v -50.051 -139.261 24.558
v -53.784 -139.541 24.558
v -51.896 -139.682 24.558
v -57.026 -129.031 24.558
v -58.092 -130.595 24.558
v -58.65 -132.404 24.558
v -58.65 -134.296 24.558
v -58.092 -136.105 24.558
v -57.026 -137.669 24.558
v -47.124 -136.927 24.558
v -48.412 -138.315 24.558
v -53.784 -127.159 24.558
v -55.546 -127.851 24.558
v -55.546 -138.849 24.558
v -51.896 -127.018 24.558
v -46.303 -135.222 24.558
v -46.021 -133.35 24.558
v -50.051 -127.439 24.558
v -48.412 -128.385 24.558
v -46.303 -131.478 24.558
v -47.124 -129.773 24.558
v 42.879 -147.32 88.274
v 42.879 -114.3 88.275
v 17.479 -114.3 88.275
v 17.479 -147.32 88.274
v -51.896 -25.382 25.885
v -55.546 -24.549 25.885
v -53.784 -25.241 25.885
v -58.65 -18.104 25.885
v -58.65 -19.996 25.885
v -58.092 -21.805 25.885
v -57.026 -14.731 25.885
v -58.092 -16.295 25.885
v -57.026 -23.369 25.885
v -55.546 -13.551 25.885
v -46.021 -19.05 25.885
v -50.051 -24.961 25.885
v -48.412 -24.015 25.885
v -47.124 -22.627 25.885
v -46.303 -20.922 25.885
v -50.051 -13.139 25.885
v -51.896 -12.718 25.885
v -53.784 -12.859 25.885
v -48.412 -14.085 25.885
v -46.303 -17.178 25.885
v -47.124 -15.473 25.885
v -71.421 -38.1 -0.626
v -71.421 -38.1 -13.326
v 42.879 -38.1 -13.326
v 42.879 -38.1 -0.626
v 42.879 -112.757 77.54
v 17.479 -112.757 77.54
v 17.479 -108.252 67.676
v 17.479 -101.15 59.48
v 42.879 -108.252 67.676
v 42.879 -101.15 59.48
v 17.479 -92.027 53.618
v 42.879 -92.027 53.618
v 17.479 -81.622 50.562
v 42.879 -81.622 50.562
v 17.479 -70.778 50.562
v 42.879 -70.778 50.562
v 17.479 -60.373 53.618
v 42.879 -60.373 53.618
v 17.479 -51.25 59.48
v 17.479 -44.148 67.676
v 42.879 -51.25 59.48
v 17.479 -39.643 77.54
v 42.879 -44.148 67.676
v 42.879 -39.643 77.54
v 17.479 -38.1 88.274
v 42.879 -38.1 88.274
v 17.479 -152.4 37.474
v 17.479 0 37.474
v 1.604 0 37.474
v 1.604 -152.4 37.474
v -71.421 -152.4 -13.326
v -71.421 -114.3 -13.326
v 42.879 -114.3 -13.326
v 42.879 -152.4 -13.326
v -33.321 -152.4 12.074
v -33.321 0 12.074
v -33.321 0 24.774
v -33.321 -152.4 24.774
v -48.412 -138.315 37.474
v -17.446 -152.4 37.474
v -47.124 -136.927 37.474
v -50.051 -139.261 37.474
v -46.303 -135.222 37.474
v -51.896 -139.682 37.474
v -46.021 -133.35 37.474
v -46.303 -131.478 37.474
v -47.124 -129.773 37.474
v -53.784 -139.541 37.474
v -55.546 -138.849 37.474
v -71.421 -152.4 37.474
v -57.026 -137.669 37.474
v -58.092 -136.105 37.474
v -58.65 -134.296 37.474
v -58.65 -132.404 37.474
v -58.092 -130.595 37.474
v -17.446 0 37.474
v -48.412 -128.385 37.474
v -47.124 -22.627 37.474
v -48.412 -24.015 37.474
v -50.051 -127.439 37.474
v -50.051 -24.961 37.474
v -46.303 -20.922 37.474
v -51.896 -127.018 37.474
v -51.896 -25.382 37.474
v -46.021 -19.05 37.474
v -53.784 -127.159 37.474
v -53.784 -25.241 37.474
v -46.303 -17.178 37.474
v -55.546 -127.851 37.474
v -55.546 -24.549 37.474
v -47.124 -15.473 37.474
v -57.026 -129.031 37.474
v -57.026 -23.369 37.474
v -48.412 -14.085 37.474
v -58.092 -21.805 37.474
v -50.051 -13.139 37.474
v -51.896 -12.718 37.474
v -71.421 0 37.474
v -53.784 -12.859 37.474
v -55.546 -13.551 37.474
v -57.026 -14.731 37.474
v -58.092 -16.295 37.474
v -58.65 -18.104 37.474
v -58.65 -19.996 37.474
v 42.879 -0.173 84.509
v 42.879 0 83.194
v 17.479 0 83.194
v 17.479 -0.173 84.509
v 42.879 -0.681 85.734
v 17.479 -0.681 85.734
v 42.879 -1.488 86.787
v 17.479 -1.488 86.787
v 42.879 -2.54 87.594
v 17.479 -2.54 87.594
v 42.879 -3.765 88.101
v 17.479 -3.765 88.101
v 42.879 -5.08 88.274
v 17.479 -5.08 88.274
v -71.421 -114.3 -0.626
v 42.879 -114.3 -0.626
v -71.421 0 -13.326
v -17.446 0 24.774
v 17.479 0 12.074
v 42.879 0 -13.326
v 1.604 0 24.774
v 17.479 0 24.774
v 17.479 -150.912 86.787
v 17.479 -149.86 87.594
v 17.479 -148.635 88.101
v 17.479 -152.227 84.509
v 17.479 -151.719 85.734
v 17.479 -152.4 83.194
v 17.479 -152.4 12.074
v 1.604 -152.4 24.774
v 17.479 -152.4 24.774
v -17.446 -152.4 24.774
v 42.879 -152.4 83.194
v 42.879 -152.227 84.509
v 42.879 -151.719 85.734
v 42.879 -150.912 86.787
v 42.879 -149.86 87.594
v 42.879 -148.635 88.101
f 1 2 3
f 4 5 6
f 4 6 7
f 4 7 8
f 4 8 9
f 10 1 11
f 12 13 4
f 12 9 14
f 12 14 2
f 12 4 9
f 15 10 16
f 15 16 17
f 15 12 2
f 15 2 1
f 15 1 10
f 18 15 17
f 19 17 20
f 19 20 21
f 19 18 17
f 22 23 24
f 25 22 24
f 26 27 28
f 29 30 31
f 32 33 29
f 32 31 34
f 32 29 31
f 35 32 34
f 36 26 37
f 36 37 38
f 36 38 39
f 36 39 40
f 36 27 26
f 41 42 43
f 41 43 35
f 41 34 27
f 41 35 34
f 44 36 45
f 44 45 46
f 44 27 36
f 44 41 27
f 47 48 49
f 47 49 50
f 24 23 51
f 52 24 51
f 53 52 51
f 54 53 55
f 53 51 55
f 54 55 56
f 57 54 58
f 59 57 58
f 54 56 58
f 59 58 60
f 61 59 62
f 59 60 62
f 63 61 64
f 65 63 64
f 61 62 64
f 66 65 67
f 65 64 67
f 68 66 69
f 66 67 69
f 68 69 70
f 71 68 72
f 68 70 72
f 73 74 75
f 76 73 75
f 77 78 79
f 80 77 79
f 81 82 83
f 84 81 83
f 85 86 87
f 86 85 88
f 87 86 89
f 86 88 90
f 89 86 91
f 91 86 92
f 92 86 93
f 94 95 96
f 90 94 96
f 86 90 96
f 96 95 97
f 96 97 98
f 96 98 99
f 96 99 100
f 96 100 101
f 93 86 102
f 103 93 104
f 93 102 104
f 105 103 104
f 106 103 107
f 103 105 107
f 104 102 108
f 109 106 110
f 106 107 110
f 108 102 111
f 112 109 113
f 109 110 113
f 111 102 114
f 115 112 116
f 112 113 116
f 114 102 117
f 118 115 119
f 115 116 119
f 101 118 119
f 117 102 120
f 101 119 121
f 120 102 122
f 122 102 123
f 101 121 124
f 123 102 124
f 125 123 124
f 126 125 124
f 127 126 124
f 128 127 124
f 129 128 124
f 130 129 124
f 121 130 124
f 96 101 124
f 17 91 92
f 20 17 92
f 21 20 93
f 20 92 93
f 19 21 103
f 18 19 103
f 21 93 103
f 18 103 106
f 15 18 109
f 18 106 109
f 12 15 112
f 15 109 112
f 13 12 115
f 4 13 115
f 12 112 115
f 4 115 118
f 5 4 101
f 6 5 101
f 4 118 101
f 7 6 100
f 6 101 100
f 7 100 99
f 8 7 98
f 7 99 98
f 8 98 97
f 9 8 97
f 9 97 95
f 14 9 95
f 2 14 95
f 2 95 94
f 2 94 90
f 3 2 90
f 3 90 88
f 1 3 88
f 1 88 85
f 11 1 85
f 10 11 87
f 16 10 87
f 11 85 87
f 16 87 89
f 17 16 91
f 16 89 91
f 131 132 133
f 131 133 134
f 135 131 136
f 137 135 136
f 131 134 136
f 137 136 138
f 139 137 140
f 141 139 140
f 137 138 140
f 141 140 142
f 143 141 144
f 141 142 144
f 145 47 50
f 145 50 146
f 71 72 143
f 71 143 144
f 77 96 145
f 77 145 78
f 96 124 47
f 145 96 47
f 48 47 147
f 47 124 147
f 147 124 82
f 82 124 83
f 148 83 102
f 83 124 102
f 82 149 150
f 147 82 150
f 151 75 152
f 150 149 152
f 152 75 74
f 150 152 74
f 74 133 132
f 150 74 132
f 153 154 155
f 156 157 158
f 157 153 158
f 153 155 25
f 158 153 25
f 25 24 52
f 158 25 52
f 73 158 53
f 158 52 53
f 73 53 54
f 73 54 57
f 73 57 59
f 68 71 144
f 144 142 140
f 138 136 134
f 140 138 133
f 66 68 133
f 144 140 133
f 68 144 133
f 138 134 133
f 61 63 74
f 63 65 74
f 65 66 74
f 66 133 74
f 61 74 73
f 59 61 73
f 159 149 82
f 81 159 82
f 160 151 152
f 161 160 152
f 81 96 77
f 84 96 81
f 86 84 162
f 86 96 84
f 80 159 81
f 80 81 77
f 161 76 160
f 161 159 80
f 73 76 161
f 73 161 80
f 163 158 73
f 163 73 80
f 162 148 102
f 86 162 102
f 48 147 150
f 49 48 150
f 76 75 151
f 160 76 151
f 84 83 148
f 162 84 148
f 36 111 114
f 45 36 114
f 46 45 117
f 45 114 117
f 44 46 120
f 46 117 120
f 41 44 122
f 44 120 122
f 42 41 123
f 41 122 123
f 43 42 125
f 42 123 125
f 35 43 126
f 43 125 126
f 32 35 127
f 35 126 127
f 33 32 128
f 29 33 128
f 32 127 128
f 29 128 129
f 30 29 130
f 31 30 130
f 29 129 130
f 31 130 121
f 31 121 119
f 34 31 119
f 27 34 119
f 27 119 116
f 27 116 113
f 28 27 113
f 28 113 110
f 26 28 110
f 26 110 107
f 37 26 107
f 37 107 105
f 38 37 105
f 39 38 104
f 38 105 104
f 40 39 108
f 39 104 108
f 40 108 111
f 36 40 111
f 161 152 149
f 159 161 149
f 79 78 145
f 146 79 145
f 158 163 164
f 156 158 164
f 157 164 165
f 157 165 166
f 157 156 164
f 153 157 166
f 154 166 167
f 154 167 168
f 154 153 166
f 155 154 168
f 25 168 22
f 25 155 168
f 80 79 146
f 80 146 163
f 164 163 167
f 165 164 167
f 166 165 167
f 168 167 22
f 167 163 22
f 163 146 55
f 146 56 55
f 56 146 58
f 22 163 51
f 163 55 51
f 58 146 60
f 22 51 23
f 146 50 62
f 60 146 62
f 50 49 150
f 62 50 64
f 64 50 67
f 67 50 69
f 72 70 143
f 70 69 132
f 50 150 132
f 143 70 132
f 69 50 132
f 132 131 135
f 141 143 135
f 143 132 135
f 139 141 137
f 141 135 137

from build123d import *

# Parameters (mm, degrees)
F1_DEPTH = 152.4
F2_W     = 76.2
F2_H     = 12.7
F3_DEPTH = 127
F4_R     = 6.35
F5_DEPTH = 11.58917
F6_DEPTH = 12.91644
F7_R     = 38.1
F8_DEPTH = 25.4
F9_R     = 5.08


with BuildPart() as f1:
    # F0 (on Front) → F1 (new body)
    with BuildSketch(Plane.XZ):
        Polygon((-17.445847, 37.4745), (-71.420847, 37.4745), (-71.420847, -13.3255), (42.879153, -13.3255), (42.879153, 88.2745), (17.479153, 88.2745), (17.479153, 37.4745), (1.604153, 37.4745), (1.604153, 24.7745), (17.479153, 24.7745), (17.479153, 12.0745), (-33.320847, 12.0745), (-33.320847, 24.7745), (-17.445847, 24.7745), align=None)
    extrude(amount=F1_DEPTH)

    # F2 (on face) → F3 (cut)
    with BuildSketch(Plane(origin=(-71.420847, 0, 0), x_dir=(0, -1, 0), z_dir=(-1, 0, 0))):
        with Locations((76.2, -6.9755)):
            Rectangle(F2_W, F2_H)
    extrude(amount=-F3_DEPTH, mode=Mode.SUBTRACT)

    # F4 (on face) → F5 (cut)
    with BuildSketch(Plane.XY.offset(37.4745)):
        with Locations((-52.370847, -19.05)):
            Circle(F4_R)
    extrude(amount=-F5_DEPTH, mode=Mode.SUBTRACT)

    # F4 (on face) → F6 (cut)
    with BuildSketch(Plane.XY.offset(37.4745)):
        with Locations((-52.370847, -133.35)):
            Circle(F4_R)
    extrude(amount=-F6_DEPTH, mode=Mode.SUBTRACT)

    # F7 (on face) → F8 (cut)
    with BuildSketch(Plane.YZ.offset(42.879153)):
        with Locations((-76.2, 88.2745)):
            Circle(F7_R)
    extrude(amount=-F8_DEPTH, mode=Mode.SUBTRACT)

    # F9
    f9_edges = [f1.edges().sort_by_distance(p)[0] for p in [
        (30.179153, 0, 88.2745),
        (30.179153, -152.4, 88.2745),
    ]]
    fillet(f9_edges, radius=F9_R)


solid = f1.part
